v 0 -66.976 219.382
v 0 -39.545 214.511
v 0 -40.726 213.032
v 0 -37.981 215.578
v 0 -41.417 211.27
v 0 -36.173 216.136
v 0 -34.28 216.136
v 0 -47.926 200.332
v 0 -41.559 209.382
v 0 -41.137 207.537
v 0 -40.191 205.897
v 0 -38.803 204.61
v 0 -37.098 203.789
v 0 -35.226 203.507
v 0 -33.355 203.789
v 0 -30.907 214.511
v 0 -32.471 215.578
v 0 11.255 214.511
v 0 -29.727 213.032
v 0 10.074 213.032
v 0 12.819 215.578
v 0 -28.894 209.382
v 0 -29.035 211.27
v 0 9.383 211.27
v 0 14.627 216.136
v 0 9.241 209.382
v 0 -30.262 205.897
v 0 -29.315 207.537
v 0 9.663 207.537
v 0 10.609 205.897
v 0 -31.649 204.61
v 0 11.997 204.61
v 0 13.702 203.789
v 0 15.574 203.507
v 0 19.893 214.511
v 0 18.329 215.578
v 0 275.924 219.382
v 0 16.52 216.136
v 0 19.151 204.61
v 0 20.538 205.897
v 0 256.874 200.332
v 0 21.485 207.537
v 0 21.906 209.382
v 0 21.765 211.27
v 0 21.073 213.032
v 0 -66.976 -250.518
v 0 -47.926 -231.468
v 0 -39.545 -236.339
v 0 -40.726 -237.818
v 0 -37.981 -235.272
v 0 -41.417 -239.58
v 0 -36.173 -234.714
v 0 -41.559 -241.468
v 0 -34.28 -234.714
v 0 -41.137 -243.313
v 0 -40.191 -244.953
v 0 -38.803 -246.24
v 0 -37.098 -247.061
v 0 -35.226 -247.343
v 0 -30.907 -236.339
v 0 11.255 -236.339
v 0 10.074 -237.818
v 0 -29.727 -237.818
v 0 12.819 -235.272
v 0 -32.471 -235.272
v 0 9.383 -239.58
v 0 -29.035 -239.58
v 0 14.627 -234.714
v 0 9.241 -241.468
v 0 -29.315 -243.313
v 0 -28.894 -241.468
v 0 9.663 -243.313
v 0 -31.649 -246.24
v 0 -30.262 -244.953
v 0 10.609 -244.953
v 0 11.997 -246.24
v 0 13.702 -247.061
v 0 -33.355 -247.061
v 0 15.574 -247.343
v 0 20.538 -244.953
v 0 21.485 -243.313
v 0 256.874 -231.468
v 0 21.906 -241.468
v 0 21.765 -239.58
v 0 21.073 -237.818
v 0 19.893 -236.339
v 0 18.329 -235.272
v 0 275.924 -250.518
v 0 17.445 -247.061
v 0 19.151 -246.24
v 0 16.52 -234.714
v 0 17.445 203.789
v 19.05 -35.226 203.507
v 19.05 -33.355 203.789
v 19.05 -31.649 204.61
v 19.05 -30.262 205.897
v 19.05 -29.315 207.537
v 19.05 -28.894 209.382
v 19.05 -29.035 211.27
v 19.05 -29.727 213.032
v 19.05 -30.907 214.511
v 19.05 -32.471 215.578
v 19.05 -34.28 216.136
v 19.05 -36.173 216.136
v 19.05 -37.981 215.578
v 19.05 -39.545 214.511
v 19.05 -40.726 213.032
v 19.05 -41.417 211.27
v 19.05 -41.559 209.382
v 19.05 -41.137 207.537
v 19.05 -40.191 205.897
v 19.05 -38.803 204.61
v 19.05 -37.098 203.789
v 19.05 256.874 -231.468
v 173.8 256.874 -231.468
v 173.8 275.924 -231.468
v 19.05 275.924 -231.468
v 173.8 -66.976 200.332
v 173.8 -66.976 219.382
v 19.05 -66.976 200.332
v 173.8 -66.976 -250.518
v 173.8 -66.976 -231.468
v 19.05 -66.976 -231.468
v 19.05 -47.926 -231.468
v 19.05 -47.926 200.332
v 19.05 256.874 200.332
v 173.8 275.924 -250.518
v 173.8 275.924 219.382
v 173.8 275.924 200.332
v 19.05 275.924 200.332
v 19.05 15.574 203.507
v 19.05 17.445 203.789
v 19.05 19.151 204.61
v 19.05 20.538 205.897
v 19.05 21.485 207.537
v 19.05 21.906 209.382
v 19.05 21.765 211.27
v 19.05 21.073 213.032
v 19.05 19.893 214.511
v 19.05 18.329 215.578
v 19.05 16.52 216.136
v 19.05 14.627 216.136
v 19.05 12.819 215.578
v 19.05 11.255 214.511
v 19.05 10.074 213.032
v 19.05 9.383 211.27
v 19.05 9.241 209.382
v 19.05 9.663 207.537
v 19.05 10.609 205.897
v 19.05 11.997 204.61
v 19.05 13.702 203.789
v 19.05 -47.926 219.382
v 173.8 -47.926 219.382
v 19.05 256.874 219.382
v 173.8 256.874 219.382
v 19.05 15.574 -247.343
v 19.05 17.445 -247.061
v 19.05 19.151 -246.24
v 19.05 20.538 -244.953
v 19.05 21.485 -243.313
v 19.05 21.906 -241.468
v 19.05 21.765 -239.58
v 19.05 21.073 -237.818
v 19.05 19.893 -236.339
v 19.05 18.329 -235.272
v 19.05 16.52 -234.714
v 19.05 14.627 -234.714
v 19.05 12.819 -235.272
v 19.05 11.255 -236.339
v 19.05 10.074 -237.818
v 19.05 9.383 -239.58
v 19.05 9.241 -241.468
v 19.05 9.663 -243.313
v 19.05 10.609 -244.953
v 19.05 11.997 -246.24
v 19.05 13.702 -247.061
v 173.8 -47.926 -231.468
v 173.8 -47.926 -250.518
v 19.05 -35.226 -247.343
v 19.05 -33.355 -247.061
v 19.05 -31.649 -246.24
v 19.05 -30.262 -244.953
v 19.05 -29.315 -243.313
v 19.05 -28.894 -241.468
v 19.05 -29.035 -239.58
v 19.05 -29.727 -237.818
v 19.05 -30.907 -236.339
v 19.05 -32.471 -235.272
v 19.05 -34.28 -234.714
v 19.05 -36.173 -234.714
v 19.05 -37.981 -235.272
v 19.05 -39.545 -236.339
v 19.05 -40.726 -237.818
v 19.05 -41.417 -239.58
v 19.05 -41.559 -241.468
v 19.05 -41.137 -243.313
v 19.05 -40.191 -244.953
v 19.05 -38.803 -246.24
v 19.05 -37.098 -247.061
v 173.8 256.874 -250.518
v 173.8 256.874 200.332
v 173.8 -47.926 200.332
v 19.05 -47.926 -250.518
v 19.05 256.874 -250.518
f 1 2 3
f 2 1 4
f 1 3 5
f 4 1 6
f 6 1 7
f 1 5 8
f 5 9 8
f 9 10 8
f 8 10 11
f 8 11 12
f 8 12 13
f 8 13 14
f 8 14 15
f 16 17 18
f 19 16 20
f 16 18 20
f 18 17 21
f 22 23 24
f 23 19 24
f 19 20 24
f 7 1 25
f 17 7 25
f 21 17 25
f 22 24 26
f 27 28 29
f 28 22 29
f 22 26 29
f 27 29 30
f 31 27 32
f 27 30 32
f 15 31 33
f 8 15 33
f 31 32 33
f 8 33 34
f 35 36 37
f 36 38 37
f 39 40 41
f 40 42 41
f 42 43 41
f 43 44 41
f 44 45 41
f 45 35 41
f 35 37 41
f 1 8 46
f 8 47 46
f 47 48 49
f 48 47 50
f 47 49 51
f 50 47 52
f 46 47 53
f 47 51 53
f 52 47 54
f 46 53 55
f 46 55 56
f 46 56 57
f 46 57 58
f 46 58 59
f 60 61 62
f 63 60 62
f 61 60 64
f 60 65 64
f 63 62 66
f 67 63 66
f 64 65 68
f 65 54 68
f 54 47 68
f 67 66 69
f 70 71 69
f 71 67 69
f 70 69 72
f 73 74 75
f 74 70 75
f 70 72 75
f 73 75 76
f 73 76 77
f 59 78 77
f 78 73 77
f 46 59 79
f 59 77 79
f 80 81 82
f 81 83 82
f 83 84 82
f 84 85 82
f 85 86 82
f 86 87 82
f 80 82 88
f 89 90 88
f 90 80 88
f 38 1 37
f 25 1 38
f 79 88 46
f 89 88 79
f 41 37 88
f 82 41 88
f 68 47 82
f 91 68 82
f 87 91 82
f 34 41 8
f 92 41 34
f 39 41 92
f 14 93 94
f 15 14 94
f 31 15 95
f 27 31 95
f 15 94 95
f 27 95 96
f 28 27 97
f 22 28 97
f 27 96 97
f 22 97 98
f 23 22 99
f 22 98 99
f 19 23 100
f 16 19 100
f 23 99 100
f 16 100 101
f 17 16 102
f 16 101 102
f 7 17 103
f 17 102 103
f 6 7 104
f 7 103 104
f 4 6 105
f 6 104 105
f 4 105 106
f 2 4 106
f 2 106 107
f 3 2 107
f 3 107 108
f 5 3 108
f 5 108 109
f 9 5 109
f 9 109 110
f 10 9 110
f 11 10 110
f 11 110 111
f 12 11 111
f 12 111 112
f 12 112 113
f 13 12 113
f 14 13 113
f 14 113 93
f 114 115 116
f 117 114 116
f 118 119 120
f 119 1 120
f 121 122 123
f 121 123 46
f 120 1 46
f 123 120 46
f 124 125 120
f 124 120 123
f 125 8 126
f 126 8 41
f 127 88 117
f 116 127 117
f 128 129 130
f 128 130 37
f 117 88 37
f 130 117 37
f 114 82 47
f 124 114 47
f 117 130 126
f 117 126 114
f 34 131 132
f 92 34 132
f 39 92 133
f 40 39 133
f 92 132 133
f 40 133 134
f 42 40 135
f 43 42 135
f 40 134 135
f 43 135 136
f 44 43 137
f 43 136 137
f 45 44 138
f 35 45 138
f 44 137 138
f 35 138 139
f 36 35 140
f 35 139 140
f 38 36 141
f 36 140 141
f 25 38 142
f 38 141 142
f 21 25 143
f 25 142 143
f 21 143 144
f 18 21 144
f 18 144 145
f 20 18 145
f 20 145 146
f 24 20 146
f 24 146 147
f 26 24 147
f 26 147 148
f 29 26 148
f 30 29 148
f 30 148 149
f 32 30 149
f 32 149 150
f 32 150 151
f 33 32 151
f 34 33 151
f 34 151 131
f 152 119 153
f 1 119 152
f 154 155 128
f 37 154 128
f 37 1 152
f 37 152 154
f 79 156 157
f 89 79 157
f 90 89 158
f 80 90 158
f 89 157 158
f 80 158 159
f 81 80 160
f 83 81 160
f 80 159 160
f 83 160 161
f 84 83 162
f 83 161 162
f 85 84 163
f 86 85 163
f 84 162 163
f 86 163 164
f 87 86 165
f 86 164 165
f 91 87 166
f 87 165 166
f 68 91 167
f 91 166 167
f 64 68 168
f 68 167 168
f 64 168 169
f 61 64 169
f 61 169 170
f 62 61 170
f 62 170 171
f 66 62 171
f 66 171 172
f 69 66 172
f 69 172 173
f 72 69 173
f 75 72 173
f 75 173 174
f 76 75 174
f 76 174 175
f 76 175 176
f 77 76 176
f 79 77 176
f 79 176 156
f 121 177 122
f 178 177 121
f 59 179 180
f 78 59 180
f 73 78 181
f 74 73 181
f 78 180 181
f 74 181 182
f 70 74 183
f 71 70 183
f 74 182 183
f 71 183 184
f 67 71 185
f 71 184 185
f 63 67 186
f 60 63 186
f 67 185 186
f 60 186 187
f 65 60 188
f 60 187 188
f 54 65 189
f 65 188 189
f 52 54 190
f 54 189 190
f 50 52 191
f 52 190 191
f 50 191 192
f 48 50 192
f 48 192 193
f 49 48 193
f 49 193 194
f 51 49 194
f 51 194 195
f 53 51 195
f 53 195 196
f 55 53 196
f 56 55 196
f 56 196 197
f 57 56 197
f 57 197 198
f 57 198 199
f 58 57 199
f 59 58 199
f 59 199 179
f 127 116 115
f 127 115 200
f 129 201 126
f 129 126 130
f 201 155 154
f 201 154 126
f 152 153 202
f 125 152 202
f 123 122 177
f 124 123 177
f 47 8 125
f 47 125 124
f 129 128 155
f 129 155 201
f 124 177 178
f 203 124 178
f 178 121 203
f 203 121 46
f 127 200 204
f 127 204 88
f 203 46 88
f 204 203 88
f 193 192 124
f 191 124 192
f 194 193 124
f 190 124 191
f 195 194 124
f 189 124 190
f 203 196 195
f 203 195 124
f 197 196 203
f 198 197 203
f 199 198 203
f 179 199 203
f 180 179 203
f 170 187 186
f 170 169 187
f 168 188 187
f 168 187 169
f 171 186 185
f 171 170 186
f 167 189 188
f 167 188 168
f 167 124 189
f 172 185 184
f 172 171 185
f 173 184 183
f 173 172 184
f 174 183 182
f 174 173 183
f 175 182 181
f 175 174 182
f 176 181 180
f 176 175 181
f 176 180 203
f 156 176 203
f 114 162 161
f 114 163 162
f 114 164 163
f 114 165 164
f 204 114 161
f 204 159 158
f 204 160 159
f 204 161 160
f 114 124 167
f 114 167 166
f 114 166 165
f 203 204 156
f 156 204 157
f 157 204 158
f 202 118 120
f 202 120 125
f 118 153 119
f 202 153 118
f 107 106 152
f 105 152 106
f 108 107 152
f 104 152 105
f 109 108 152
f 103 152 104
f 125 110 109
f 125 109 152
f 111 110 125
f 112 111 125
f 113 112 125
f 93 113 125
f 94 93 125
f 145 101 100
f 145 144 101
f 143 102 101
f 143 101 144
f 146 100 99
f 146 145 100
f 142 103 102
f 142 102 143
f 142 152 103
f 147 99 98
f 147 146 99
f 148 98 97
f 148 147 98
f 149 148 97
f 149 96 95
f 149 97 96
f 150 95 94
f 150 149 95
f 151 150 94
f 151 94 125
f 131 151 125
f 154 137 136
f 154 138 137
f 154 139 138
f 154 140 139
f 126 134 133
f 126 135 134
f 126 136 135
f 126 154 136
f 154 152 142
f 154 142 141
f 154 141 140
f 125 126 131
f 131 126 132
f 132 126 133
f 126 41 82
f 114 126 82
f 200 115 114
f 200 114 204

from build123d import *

# Parameters (mm, degrees)
SKETCH2_W           = 431.8
SKETCH2_H           = 19.05
SKETCH2_W_2         = 19.05
SKETCH2_H_2         = 342.9
BOSS_EXTRUDE1_DEPTH = 19.05
SKETCH3_R           = 6.35
CUT_EXTRUDE1_DEPTH  = 25.4
SKETCH4_W           = 19.05
SKETCH4_H           = 19.05
BOSS_EXTRUDE2_DEPTH = 154.7495


with BuildPart() as part:
    # Sketch2 → Boss-Extrude1 (new body)
    with BuildSketch(Plane(origin=(0, 0, 0), x_dir=(0, 0, -1), z_dir=(1, 0, 0))):
        with Locations((15.568493322, 266.398734107)):
            Rectangle(SKETCH2_W, SKETCH2_H)
        with Locations((-209.856506678, 104.473734107)):
            Rectangle(SKETCH2_W_2, SKETCH2_H_2)
        with Locations((15.568493322, -57.451265893)):
            Rectangle(SKETCH2_W, SKETCH2_H)
        Polygon((250.518493322, 275.923734107), (231.468493322, 275.923734107), (231.468493322, 256.873734107), (231.468493322, -47.926265893), (231.468493322, -66.976265893), (250.518493322, -66.976265893), align=None)
    extrude(amount=BOSS_EXTRUDE1_DEPTH)

    # Sketch3 → Cut-Extrude1 (cut)
    with BuildSketch(Plane(origin=(19.05, 0, 0), x_dir=(0, 0, -1), z_dir=(1, 0, 0))):
        with Locations((-209.856506678, 15.573734107)):
            Circle(SKETCH3_R)
        with Locations((-209.856506678, -35.226265893)):
            Circle(SKETCH3_R)
        with Locations((240.993493322, -35.226265893)):
            Circle(SKETCH3_R)
        with Locations((240.993493322, 15.573734107)):
            Circle(SKETCH3_R)
    extrude(amount=-CUT_EXTRUDE1_DEPTH, mode=Mode.SUBTRACT)

    # Sketch4 → Boss-Extrude2 (add)
    with BuildSketch(Plane(origin=(19.05, 0, 0), x_dir=(0, 0, -1), z_dir=(1, 0, 0))):
        with Locations((-209.856506678, -57.451265893)):
            Rectangle(SKETCH4_W, SKETCH4_H)
        with Locations((-209.856506678, 266.398734107)):
            Rectangle(SKETCH4_W, SKETCH4_H)
        with Locations((240.993493322, 266.398734107)):
            Rectangle(SKETCH4_W, SKETCH4_H)
        with Locations((240.993493322, -57.451265893)):
            Rectangle(SKETCH4_W, SKETCH4_H)
    extrude(amount=BOSS_EXTRUDE2_DEPTH)


solid = part.part
